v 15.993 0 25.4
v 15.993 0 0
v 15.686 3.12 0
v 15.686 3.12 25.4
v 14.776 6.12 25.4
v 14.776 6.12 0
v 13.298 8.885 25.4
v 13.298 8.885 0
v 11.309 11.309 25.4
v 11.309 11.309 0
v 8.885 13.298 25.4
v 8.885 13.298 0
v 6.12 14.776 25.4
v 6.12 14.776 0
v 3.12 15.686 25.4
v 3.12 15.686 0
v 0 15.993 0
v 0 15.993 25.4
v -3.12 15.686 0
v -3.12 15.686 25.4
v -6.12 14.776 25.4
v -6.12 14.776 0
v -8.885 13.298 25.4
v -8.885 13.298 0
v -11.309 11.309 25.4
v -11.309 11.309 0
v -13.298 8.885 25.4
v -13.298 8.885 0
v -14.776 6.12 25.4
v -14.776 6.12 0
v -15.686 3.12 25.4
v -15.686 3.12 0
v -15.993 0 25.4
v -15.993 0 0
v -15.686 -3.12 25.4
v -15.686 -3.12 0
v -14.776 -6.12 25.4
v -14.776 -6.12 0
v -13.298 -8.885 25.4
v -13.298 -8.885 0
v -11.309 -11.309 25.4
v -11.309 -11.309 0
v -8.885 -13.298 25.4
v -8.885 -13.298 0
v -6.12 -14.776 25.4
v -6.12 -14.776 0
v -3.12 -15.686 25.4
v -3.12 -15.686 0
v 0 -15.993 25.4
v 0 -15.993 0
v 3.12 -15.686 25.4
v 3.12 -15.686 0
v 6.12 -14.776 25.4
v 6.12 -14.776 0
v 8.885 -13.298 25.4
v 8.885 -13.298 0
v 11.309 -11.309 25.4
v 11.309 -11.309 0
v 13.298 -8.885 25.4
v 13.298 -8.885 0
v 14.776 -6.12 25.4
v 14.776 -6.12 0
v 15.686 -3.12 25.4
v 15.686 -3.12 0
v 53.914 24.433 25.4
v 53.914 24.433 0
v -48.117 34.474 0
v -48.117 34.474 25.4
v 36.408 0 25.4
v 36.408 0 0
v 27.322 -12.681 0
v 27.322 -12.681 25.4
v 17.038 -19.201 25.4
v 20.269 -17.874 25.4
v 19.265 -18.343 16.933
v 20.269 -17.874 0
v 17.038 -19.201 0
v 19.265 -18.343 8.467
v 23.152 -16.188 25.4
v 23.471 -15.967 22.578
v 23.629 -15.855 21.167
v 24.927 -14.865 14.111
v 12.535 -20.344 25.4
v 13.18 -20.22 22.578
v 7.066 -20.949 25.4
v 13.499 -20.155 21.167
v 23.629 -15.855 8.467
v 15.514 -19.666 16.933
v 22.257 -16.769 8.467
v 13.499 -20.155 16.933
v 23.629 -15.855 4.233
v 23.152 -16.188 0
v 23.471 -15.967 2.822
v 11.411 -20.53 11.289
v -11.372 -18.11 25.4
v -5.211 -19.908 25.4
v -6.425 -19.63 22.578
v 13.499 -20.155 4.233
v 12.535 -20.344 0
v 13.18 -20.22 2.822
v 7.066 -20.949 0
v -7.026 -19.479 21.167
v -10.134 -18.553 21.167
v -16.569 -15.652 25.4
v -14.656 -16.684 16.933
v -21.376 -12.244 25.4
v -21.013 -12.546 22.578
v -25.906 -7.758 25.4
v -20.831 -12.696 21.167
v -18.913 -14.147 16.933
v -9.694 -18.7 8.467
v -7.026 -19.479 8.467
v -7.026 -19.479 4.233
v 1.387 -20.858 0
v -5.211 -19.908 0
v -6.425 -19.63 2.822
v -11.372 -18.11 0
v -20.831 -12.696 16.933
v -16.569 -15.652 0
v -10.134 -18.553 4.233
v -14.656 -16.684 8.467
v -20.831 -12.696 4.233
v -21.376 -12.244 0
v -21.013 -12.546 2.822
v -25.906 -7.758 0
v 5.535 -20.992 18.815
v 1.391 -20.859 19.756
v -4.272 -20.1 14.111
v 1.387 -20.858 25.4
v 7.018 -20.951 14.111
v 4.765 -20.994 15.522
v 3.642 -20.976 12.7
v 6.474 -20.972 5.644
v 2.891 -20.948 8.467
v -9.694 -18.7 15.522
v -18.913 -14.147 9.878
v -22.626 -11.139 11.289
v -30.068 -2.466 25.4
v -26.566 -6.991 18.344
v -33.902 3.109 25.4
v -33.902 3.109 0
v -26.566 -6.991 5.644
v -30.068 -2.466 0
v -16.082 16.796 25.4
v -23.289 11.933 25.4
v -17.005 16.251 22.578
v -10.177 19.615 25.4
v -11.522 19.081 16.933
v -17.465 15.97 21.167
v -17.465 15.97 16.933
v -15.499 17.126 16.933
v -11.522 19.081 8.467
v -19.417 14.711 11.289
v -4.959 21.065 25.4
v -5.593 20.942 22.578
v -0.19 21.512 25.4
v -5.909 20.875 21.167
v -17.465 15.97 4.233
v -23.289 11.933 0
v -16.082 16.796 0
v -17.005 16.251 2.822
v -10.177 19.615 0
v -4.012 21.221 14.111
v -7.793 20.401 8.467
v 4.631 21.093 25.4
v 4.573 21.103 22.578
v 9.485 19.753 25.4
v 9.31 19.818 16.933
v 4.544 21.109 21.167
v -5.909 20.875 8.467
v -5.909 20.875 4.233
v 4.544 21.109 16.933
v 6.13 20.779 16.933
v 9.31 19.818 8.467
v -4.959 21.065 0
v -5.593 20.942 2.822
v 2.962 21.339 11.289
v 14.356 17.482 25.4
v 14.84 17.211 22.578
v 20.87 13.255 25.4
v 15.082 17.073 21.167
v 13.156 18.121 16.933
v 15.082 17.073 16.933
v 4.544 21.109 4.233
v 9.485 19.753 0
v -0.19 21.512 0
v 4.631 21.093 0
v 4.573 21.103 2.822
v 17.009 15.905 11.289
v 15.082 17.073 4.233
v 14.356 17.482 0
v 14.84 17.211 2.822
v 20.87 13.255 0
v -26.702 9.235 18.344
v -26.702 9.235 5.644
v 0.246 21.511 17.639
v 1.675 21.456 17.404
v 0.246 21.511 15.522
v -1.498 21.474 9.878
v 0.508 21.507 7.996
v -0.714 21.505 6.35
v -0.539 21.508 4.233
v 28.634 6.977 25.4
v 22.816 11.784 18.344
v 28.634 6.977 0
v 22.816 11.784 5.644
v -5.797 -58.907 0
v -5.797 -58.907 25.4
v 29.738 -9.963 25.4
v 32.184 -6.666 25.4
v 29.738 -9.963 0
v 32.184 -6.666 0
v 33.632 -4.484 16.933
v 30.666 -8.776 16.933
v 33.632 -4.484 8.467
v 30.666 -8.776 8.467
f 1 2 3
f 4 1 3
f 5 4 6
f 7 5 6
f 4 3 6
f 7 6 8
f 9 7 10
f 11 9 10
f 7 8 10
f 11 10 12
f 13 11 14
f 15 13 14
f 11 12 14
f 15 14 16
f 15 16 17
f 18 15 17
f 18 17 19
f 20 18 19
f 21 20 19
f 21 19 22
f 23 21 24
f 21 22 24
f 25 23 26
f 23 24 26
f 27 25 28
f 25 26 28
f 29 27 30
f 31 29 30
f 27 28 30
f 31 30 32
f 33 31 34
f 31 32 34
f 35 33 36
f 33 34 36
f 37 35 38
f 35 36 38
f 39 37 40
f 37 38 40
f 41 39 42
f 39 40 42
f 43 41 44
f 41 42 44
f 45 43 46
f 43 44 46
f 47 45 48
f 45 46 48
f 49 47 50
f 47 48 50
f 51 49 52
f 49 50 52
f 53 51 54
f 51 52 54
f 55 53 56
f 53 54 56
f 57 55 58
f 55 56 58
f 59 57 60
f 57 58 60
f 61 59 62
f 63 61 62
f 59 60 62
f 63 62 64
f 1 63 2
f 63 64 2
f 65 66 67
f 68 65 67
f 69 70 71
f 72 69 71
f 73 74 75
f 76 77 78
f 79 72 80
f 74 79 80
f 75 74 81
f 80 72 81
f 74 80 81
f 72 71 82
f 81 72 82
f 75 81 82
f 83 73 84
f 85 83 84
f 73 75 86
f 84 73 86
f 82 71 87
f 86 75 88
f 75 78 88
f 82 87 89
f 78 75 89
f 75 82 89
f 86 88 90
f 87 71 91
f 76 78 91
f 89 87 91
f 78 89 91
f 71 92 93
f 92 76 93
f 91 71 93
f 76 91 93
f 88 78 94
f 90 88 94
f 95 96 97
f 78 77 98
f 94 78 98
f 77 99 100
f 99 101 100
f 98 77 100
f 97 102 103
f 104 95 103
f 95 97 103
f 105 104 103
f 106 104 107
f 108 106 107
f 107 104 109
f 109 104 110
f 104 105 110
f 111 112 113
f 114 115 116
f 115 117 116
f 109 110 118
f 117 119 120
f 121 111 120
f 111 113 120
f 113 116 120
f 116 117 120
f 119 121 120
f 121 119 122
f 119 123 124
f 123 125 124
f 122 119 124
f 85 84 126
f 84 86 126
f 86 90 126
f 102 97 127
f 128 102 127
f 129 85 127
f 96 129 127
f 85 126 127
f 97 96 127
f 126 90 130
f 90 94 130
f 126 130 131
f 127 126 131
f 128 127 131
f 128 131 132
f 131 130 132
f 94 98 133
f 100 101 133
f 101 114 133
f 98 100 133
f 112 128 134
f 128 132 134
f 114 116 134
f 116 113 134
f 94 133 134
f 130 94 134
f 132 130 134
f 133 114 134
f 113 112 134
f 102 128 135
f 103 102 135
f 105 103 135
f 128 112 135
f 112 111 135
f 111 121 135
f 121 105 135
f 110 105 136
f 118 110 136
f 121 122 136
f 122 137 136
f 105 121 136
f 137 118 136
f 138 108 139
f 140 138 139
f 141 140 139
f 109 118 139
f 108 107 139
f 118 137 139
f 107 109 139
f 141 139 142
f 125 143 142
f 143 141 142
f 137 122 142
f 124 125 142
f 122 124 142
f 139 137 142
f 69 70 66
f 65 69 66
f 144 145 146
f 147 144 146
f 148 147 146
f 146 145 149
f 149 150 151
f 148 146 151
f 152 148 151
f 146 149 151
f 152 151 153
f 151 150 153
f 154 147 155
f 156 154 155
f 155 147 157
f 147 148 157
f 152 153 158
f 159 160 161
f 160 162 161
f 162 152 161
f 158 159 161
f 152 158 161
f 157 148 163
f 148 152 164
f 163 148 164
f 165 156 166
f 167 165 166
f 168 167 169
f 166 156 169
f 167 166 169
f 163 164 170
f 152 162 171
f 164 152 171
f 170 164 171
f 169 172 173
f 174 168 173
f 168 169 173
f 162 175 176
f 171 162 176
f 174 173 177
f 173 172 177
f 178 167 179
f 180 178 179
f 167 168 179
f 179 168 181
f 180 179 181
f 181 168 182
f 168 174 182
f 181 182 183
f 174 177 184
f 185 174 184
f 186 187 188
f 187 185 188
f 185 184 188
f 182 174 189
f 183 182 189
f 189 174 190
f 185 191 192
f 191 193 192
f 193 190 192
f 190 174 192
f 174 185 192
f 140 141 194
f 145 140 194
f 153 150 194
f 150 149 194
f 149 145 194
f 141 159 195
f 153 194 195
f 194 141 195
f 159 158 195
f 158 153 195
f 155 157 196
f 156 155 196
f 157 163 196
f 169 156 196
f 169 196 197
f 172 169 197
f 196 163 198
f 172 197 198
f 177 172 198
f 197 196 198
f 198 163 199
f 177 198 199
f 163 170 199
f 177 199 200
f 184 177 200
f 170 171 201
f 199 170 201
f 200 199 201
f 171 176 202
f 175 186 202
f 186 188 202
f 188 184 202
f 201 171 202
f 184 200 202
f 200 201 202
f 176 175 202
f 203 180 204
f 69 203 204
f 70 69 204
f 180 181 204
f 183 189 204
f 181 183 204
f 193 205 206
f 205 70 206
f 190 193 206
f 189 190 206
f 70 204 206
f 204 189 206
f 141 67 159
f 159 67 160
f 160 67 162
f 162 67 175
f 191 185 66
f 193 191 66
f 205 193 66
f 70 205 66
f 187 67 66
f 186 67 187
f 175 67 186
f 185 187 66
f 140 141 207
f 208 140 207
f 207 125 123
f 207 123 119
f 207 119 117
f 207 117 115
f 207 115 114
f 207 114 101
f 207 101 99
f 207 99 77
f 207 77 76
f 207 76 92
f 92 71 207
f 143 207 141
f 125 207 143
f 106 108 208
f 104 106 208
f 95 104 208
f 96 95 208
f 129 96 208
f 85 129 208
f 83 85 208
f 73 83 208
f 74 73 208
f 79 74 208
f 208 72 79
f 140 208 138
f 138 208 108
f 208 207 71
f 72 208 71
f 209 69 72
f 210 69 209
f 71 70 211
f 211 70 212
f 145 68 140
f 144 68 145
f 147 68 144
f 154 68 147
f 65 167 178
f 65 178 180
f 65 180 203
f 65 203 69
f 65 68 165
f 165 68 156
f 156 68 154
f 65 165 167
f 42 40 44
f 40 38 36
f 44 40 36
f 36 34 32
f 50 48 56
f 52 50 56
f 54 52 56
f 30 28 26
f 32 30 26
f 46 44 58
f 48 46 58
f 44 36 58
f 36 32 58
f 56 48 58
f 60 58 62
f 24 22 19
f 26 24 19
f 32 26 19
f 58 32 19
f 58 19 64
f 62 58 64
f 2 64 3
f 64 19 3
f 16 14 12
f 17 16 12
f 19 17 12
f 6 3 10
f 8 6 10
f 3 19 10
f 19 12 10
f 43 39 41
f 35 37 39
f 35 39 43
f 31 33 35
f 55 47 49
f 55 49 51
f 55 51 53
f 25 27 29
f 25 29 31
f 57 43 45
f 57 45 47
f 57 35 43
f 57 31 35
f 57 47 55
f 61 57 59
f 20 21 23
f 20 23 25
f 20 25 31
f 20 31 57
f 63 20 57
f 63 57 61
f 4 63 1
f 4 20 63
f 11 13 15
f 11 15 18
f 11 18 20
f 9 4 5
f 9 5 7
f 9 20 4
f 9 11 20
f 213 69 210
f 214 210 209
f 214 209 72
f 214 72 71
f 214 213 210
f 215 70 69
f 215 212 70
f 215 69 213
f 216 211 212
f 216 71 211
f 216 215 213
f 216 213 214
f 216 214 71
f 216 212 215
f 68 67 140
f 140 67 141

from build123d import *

# Parameters (mm, degrees)
F1_DEPTH = 25.4
F2_R     = 15.9930438788
F3_DEPTH = 25.4


with BuildPart() as f1:
    # F0 (on Top) → F1 (new body)
    with BuildSketch(Plane.XY):
        with BuildLine():
            Line((36.4083144305, 0), (53.9139731383, 24.4330322388))
            Line((53.9139731383, 24.4330322388), (-48.1166131794, 34.4743542373))
            Line((-48.1166131794, 34.4743542373), (-33.9024768455, 3.109415289))
            add(Edge.make_bspline(
                [(-33.9024768455, 3.109415289), (-26.5750770472, 9.4648362976), (-12.8675760269, 21.3540387917), (11.1528533904, 23.0372202248), (27.3496098458, 8.2630593098), (36.4083144305, 0)],
                knots=[0, 0, 0, 0, 0.336052796, 0.6286601211, 1, 1, 1, 1], degree=3))
        make_face()
    extrude(amount=F1_DEPTH)


with BuildPart() as f1b:
    # F0 (on Top) → F1, piece 2 (new body)
    with BuildSketch(Plane.XY):
        with BuildLine():
            Line((-5.7973599589, -58.9073864761), (27.3224899861, -12.681284679))
            add(Edge.make_bspline(
                [(27.3224899861, -12.681284679), (25.0484021441, -14.9891045916), (14.5874263856, -22.8347435286), (-17.8496784828, -20.7680233971), (-28.7393422163, -4.5703940346), (-33.9024768455, 3.109415289)],
                knots=[0.1907237868, 0.1907237868, 0.1907237868, 0.1907237868, 0.3113645625, 0.6734961188, 1, 1, 1, 1], degree=3))
            Line((-33.9024768455, 3.109415289), (-5.7973599589, -58.9073864761))
        make_face()
    extrude(amount=F1_DEPTH)


with BuildPart() as f1c:
    # F0 (on Top) → F1, piece 3 (new body)
    with BuildSketch(Plane.XY):
        with BuildLine():
            add(Edge.make_bspline(
                [(36.4083144305, 0), (33.6629811881, -4.5163994552), (30.9176479457, -9.0327989105), (27.3224899861, -12.681284679)],
                knots=[0, 0, 0, 0, 0.1907237868, 0.1907237868, 0.1907237868, 0.1907237868], degree=3))
            Line((36.4083144305, 0), (27.3224899861, -12.681284679))
        make_face()
    extrude(amount=F1_DEPTH)


with BuildPart() as f3:
    # F2 (on Top) → F3 (new body)
    with BuildSketch(Plane.XY):
        Circle(F2_R)
    extrude(amount=F3_DEPTH)


solid = Compound([f1.part, f1b.part, f1c.part, f3.part])
